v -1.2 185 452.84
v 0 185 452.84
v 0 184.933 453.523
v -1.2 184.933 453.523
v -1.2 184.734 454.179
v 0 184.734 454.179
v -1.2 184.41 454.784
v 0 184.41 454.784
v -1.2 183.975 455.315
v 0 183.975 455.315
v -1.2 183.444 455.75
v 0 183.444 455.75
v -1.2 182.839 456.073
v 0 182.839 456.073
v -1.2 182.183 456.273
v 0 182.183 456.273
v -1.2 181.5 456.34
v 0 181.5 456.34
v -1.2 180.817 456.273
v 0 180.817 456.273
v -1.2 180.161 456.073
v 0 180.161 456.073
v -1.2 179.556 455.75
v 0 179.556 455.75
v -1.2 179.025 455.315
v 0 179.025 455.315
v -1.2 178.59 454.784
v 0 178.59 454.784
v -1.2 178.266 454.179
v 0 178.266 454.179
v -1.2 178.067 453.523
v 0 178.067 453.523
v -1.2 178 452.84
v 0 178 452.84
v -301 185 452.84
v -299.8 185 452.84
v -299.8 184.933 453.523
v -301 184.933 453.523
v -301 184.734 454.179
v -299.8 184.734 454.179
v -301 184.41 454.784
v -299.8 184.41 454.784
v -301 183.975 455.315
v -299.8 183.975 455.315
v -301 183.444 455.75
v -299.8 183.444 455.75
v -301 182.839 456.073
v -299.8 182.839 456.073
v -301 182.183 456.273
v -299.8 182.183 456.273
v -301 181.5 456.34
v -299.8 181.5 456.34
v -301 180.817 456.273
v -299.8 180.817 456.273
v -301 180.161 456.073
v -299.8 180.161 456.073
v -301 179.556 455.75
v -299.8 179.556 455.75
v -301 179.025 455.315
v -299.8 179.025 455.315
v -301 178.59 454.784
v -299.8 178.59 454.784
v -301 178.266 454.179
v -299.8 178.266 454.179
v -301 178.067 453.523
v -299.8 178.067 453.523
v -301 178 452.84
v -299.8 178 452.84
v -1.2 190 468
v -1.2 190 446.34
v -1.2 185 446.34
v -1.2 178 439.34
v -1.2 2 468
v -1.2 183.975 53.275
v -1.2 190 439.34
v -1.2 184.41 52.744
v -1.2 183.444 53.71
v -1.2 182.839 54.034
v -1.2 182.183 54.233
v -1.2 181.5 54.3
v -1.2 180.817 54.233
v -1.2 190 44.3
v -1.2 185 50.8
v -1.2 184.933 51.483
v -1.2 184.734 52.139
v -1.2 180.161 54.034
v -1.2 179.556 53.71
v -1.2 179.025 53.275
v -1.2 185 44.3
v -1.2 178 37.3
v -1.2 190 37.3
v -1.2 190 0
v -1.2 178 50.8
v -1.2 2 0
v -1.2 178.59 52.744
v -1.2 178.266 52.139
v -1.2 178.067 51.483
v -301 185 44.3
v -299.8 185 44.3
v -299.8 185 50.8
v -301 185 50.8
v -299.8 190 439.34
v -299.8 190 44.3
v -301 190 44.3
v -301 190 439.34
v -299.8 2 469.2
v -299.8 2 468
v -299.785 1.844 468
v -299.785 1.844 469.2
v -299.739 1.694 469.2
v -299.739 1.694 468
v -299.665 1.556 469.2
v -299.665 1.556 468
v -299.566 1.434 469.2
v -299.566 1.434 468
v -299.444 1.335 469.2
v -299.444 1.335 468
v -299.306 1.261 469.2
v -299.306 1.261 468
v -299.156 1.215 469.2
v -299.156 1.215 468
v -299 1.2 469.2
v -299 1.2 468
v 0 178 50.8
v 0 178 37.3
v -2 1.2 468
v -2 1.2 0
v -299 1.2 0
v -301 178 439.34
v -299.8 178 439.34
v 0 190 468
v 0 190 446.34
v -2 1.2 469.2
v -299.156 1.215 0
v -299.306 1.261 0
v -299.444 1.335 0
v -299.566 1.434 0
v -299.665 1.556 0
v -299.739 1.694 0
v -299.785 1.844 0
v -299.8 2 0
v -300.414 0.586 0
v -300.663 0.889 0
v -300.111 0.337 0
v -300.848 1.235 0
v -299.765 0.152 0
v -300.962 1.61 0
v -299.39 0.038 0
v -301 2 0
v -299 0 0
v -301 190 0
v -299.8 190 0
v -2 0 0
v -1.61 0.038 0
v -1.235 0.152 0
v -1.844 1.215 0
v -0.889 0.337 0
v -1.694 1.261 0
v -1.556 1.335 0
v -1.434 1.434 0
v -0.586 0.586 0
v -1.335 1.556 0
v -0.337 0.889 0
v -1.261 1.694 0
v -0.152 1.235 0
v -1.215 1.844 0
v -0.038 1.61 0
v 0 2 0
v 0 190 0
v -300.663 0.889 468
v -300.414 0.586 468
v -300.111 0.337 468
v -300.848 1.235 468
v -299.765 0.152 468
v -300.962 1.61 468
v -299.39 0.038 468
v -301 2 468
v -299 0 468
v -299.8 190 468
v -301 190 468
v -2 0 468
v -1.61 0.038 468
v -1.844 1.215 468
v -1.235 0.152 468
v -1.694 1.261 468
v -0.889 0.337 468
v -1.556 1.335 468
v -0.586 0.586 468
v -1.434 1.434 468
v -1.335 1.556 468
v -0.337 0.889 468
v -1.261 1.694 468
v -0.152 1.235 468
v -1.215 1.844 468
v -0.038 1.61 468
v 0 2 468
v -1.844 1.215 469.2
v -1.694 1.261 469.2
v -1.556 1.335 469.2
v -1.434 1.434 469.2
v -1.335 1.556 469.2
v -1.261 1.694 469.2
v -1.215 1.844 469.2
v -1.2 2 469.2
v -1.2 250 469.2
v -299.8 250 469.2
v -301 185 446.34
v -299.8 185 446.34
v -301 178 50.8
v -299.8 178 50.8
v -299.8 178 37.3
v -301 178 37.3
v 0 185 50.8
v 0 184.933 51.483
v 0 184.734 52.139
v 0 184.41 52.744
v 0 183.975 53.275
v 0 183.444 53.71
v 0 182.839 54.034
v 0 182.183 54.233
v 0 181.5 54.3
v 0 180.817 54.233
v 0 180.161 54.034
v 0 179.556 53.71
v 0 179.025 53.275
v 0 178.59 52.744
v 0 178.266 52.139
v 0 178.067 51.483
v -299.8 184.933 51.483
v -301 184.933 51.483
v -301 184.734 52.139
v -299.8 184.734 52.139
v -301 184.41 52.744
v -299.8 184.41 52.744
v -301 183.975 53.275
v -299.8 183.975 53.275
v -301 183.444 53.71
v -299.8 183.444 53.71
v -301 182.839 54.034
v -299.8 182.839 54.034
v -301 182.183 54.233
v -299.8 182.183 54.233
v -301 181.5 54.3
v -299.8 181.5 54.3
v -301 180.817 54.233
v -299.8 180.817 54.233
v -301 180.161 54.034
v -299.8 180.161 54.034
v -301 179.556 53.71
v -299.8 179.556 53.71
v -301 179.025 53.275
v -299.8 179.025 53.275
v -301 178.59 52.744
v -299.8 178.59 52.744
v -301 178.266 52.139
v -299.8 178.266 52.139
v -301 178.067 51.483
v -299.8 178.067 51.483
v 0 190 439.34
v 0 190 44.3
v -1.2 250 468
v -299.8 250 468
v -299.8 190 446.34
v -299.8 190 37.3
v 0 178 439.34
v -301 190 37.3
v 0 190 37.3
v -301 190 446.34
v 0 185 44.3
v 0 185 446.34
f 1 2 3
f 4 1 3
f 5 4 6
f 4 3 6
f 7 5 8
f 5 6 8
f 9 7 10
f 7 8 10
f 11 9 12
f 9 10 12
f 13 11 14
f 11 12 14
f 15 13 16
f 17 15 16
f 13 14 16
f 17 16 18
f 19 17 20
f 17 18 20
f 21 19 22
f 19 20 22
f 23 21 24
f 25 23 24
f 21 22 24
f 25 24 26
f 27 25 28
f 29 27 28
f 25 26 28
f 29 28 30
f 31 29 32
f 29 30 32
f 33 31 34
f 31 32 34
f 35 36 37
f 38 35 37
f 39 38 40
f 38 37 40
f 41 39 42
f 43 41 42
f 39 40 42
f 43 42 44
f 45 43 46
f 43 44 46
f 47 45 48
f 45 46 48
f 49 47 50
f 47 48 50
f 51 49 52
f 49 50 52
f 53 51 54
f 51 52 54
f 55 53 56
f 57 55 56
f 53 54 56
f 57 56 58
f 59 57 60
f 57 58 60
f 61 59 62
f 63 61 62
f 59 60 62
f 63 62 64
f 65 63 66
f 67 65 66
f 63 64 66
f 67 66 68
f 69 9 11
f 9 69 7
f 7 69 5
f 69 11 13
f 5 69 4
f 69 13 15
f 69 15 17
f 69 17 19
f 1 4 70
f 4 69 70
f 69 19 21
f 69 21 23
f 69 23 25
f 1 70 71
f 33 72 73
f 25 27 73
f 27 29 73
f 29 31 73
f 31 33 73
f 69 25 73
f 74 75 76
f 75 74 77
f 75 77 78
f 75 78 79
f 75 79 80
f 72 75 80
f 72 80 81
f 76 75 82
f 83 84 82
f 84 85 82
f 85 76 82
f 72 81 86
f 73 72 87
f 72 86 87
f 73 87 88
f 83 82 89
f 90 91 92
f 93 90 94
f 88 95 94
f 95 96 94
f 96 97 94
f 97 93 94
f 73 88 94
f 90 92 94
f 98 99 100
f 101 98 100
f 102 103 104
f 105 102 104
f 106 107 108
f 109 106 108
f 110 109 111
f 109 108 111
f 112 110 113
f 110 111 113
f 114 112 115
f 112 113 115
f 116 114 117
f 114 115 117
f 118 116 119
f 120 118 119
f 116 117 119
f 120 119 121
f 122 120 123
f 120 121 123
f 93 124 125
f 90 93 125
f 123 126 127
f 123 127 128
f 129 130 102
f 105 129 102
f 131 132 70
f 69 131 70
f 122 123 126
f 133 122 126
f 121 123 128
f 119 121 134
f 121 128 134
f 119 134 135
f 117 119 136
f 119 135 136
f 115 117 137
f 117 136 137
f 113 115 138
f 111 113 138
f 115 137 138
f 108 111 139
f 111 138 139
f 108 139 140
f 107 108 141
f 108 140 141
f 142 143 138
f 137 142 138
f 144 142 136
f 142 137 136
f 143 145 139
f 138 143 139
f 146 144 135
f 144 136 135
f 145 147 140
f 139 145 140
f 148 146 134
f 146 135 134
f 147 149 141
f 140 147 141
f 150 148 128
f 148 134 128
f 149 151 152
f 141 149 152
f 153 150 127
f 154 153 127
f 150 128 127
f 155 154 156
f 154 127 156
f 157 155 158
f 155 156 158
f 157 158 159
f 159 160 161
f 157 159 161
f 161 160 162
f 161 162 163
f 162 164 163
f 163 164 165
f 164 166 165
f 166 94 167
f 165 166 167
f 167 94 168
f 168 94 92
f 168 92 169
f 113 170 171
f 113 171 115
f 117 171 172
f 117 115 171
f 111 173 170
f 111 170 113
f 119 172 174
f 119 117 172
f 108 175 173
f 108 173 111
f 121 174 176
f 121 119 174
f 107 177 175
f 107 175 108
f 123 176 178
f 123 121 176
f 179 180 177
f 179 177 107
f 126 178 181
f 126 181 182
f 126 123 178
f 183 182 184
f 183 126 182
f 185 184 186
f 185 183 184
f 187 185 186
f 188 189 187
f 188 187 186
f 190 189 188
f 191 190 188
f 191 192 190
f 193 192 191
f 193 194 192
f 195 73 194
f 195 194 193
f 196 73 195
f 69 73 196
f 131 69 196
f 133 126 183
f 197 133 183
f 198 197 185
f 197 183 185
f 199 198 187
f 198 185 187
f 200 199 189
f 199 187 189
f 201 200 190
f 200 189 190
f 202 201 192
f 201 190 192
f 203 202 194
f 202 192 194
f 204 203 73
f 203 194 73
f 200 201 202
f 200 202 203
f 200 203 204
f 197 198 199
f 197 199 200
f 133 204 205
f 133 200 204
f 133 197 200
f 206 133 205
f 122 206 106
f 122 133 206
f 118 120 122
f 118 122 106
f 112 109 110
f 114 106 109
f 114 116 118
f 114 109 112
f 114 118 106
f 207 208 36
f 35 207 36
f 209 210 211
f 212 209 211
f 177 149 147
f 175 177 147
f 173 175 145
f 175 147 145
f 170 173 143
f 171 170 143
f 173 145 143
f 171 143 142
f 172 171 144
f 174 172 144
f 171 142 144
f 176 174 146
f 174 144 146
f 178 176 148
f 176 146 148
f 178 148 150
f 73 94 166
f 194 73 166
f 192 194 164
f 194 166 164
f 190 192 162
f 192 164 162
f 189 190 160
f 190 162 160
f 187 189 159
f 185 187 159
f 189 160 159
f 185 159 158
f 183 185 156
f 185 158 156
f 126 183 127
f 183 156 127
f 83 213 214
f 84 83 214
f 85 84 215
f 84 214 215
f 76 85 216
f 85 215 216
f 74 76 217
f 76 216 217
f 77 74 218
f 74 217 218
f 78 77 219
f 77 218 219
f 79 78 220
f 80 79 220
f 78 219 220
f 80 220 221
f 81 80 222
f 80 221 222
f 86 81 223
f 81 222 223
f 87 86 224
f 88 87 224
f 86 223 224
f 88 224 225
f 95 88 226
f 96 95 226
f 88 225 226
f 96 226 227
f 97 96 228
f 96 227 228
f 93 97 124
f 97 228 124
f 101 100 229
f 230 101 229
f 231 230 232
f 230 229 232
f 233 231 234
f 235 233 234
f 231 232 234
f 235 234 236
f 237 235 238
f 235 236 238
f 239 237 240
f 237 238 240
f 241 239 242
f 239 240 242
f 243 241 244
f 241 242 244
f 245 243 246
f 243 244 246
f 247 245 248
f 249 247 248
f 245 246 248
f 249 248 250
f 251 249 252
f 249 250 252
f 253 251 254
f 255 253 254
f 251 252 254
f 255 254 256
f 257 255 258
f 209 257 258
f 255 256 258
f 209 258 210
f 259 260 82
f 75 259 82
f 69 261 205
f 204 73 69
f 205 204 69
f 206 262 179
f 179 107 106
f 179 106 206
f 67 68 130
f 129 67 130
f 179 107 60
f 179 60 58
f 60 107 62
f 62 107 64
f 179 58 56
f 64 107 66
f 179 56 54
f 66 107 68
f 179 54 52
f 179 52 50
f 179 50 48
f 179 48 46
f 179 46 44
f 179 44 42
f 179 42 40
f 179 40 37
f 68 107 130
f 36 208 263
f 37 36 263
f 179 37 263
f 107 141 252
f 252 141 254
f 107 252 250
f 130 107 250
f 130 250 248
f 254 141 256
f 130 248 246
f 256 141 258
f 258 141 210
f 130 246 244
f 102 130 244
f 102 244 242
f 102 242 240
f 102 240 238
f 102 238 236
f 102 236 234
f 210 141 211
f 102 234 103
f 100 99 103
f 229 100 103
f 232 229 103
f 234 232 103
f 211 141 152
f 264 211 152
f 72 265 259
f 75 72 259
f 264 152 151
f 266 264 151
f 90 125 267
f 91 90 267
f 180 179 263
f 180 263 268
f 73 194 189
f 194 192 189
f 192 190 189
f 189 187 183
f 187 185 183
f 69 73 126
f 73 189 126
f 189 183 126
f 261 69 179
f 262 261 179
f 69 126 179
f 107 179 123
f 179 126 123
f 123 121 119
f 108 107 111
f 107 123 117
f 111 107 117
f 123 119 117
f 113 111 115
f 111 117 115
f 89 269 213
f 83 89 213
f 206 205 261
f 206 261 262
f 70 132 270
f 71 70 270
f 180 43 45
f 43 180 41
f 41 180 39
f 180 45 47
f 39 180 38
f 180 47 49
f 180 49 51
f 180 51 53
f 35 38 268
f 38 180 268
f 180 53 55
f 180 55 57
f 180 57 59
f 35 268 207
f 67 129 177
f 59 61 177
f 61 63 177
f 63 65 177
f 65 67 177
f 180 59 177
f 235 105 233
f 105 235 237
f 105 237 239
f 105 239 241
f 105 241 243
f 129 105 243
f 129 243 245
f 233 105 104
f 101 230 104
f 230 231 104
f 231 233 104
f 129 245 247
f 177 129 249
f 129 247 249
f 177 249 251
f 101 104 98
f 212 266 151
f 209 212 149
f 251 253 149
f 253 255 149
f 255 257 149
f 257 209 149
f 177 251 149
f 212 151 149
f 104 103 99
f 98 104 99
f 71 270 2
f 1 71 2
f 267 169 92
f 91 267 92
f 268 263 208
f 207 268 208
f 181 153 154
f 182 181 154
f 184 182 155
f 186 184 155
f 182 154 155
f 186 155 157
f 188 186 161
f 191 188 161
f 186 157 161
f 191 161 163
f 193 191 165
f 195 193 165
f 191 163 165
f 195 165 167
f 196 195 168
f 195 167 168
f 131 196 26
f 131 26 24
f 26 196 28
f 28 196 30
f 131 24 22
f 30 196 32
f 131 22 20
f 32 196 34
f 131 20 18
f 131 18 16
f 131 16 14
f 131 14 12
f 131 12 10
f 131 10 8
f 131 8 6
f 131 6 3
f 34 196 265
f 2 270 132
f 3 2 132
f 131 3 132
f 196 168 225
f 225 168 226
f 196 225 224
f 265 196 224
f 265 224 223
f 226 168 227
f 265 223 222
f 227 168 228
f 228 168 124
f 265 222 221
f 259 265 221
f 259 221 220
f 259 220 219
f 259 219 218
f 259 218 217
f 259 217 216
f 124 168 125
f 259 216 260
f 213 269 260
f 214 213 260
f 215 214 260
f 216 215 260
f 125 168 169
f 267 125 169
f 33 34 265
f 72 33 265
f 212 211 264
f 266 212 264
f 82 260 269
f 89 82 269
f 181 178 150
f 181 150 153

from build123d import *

# Parameters (mm, degrees)
F1_DEPTH  = 468
F3_DEPTH  = 1.2
F3_FACE_W = 298.6
F3_FACE_H = 1.2
F4_DEPTH  = 60
F6_DEPTH  = 1.2
F7_DEPTH  = 1.2
F9_DEPTH  = 1.2


with BuildPart() as f1:
    # F0 (on Top) → F1 (new body)
    with BuildSketch(Plane.XY):
        with BuildLine():
            Line((-299, 0), (-2, 0))
            ThreePointArc((-2, 0), (-0.585786, 0.585786), (0, 2))
            Line((0, 2), (0, 190))
            Line((0, 190), (-1.2, 190))
            Line((-1.2, 190), (-1.2, 2))
            ThreePointArc((-1.2, 2), (-1.434315, 1.434315), (-2, 1.2))
            Line((-2, 1.2), (-299, 1.2))
            ThreePointArc((-299, 1.2), (-299.565685, 1.434315), (-299.8, 2))
            Line((-299.8, 2), (-299.8, 190))
            Line((-299.8, 190), (-301, 190))
            Line((-301, 190), (-301, 2))
            ThreePointArc((-301, 2), (-300.414214, 0.585786), (-299, 0))
        make_face()
    extrude(amount=F1_DEPTH)



with BuildPart() as f3:
    # F2 (on face) → F3 (new body)
    with BuildSketch(Plane.XY.offset(468)):
        with BuildLine():
            Line((-1.2, 190), (-299.8, 190))
            Line((-299.8, 190), (-299.8, 2))
            ThreePointArc((-299.8, 2), (-299.565685, 1.434315), (-299, 1.2))
            Line((-299, 1.2), (-2, 1.2))
            ThreePointArc((-2, 1.2), (-1.434315, 1.434315), (-1.2, 2))
            Line((-1.2, 2), (-1.2, 190))
        make_face()
    extrude(amount=F3_DEPTH)


with BuildPart() as f1_1:
    add(f1.part)

    add(f3.part)  # F4 merges F3
    # F3_face (on face) → F4 (join)
    with BuildSketch(Plane(origin=(-150.5, 190, 468.6), x_dir=(-1, 0, 0), z_dir=(0, 1, 0))):
        Rectangle(F3_FACE_W, F3_FACE_H)
    extrude(amount=F4_DEPTH)

    # F5 (on face) → F6 (cut)
    with BuildSketch(Plane.YZ):
        with BuildLine():
            Line((178, 439.339846), (190, 439.339846))
            Line((190, 439.339846), (190, 446.339846))
            Line((190, 446.339846), (185, 446.339846))
            Line((185, 446.339846), (185, 452.839846))
            ThreePointArc((185, 452.839846), (181.5, 456.339846), (178, 452.839846))
            Line((178, 452.839846), (178, 439.339846))
        make_face()
    extrude(amount=-F6_DEPTH, mode=Mode.SUBTRACT)

    # F5 (on face) → F7 (cut)
    with BuildSketch(Plane.YZ):
        with BuildLine():
            Line((178, 37.300002), (190, 37.300002))
            Line((190, 37.300002), (190, 44.300002))
            Line((190, 44.300002), (185, 44.300002))
            Line((185, 44.300002), (185, 50.800002))
            ThreePointArc((185, 50.800002), (181.5, 54.300002), (178, 50.800002))
            Line((178, 50.800002), (178, 37.300002))
        make_face()
    extrude(amount=-F7_DEPTH, mode=Mode.SUBTRACT)

    # F8 (on face) → F9 (cut)
    with BuildSketch(Plane.YZ.offset(-299.8)):
        with BuildLine():
            Line((190, 44.300002), (185, 44.300002))
            Line((185, 44.300002), (185, 50.800002))
            ThreePointArc((185, 50.800002), (181.5, 54.300002), (178, 50.800002))
            Line((178, 50.800002), (178, 37.300002))
            Line((178, 37.300002), (190, 37.300002))
            Line((190, 37.300002), (190, 44.300002))
        make_face()
        with BuildLine():
            Line((178, 439.339846), (190, 439.339846))
            Line((190, 439.339846), (190, 446.339846))
            Line((190, 446.339846), (185, 446.339846))
            Line((185, 446.339846), (185, 452.839846))
            ThreePointArc((185, 452.839846), (181.5, 456.339846), (178, 452.839846))
            Line((178, 452.839846), (178, 439.339846))
        make_face()
    extrude(amount=-F9_DEPTH, mode=Mode.SUBTRACT)


solid = f1_1.part
